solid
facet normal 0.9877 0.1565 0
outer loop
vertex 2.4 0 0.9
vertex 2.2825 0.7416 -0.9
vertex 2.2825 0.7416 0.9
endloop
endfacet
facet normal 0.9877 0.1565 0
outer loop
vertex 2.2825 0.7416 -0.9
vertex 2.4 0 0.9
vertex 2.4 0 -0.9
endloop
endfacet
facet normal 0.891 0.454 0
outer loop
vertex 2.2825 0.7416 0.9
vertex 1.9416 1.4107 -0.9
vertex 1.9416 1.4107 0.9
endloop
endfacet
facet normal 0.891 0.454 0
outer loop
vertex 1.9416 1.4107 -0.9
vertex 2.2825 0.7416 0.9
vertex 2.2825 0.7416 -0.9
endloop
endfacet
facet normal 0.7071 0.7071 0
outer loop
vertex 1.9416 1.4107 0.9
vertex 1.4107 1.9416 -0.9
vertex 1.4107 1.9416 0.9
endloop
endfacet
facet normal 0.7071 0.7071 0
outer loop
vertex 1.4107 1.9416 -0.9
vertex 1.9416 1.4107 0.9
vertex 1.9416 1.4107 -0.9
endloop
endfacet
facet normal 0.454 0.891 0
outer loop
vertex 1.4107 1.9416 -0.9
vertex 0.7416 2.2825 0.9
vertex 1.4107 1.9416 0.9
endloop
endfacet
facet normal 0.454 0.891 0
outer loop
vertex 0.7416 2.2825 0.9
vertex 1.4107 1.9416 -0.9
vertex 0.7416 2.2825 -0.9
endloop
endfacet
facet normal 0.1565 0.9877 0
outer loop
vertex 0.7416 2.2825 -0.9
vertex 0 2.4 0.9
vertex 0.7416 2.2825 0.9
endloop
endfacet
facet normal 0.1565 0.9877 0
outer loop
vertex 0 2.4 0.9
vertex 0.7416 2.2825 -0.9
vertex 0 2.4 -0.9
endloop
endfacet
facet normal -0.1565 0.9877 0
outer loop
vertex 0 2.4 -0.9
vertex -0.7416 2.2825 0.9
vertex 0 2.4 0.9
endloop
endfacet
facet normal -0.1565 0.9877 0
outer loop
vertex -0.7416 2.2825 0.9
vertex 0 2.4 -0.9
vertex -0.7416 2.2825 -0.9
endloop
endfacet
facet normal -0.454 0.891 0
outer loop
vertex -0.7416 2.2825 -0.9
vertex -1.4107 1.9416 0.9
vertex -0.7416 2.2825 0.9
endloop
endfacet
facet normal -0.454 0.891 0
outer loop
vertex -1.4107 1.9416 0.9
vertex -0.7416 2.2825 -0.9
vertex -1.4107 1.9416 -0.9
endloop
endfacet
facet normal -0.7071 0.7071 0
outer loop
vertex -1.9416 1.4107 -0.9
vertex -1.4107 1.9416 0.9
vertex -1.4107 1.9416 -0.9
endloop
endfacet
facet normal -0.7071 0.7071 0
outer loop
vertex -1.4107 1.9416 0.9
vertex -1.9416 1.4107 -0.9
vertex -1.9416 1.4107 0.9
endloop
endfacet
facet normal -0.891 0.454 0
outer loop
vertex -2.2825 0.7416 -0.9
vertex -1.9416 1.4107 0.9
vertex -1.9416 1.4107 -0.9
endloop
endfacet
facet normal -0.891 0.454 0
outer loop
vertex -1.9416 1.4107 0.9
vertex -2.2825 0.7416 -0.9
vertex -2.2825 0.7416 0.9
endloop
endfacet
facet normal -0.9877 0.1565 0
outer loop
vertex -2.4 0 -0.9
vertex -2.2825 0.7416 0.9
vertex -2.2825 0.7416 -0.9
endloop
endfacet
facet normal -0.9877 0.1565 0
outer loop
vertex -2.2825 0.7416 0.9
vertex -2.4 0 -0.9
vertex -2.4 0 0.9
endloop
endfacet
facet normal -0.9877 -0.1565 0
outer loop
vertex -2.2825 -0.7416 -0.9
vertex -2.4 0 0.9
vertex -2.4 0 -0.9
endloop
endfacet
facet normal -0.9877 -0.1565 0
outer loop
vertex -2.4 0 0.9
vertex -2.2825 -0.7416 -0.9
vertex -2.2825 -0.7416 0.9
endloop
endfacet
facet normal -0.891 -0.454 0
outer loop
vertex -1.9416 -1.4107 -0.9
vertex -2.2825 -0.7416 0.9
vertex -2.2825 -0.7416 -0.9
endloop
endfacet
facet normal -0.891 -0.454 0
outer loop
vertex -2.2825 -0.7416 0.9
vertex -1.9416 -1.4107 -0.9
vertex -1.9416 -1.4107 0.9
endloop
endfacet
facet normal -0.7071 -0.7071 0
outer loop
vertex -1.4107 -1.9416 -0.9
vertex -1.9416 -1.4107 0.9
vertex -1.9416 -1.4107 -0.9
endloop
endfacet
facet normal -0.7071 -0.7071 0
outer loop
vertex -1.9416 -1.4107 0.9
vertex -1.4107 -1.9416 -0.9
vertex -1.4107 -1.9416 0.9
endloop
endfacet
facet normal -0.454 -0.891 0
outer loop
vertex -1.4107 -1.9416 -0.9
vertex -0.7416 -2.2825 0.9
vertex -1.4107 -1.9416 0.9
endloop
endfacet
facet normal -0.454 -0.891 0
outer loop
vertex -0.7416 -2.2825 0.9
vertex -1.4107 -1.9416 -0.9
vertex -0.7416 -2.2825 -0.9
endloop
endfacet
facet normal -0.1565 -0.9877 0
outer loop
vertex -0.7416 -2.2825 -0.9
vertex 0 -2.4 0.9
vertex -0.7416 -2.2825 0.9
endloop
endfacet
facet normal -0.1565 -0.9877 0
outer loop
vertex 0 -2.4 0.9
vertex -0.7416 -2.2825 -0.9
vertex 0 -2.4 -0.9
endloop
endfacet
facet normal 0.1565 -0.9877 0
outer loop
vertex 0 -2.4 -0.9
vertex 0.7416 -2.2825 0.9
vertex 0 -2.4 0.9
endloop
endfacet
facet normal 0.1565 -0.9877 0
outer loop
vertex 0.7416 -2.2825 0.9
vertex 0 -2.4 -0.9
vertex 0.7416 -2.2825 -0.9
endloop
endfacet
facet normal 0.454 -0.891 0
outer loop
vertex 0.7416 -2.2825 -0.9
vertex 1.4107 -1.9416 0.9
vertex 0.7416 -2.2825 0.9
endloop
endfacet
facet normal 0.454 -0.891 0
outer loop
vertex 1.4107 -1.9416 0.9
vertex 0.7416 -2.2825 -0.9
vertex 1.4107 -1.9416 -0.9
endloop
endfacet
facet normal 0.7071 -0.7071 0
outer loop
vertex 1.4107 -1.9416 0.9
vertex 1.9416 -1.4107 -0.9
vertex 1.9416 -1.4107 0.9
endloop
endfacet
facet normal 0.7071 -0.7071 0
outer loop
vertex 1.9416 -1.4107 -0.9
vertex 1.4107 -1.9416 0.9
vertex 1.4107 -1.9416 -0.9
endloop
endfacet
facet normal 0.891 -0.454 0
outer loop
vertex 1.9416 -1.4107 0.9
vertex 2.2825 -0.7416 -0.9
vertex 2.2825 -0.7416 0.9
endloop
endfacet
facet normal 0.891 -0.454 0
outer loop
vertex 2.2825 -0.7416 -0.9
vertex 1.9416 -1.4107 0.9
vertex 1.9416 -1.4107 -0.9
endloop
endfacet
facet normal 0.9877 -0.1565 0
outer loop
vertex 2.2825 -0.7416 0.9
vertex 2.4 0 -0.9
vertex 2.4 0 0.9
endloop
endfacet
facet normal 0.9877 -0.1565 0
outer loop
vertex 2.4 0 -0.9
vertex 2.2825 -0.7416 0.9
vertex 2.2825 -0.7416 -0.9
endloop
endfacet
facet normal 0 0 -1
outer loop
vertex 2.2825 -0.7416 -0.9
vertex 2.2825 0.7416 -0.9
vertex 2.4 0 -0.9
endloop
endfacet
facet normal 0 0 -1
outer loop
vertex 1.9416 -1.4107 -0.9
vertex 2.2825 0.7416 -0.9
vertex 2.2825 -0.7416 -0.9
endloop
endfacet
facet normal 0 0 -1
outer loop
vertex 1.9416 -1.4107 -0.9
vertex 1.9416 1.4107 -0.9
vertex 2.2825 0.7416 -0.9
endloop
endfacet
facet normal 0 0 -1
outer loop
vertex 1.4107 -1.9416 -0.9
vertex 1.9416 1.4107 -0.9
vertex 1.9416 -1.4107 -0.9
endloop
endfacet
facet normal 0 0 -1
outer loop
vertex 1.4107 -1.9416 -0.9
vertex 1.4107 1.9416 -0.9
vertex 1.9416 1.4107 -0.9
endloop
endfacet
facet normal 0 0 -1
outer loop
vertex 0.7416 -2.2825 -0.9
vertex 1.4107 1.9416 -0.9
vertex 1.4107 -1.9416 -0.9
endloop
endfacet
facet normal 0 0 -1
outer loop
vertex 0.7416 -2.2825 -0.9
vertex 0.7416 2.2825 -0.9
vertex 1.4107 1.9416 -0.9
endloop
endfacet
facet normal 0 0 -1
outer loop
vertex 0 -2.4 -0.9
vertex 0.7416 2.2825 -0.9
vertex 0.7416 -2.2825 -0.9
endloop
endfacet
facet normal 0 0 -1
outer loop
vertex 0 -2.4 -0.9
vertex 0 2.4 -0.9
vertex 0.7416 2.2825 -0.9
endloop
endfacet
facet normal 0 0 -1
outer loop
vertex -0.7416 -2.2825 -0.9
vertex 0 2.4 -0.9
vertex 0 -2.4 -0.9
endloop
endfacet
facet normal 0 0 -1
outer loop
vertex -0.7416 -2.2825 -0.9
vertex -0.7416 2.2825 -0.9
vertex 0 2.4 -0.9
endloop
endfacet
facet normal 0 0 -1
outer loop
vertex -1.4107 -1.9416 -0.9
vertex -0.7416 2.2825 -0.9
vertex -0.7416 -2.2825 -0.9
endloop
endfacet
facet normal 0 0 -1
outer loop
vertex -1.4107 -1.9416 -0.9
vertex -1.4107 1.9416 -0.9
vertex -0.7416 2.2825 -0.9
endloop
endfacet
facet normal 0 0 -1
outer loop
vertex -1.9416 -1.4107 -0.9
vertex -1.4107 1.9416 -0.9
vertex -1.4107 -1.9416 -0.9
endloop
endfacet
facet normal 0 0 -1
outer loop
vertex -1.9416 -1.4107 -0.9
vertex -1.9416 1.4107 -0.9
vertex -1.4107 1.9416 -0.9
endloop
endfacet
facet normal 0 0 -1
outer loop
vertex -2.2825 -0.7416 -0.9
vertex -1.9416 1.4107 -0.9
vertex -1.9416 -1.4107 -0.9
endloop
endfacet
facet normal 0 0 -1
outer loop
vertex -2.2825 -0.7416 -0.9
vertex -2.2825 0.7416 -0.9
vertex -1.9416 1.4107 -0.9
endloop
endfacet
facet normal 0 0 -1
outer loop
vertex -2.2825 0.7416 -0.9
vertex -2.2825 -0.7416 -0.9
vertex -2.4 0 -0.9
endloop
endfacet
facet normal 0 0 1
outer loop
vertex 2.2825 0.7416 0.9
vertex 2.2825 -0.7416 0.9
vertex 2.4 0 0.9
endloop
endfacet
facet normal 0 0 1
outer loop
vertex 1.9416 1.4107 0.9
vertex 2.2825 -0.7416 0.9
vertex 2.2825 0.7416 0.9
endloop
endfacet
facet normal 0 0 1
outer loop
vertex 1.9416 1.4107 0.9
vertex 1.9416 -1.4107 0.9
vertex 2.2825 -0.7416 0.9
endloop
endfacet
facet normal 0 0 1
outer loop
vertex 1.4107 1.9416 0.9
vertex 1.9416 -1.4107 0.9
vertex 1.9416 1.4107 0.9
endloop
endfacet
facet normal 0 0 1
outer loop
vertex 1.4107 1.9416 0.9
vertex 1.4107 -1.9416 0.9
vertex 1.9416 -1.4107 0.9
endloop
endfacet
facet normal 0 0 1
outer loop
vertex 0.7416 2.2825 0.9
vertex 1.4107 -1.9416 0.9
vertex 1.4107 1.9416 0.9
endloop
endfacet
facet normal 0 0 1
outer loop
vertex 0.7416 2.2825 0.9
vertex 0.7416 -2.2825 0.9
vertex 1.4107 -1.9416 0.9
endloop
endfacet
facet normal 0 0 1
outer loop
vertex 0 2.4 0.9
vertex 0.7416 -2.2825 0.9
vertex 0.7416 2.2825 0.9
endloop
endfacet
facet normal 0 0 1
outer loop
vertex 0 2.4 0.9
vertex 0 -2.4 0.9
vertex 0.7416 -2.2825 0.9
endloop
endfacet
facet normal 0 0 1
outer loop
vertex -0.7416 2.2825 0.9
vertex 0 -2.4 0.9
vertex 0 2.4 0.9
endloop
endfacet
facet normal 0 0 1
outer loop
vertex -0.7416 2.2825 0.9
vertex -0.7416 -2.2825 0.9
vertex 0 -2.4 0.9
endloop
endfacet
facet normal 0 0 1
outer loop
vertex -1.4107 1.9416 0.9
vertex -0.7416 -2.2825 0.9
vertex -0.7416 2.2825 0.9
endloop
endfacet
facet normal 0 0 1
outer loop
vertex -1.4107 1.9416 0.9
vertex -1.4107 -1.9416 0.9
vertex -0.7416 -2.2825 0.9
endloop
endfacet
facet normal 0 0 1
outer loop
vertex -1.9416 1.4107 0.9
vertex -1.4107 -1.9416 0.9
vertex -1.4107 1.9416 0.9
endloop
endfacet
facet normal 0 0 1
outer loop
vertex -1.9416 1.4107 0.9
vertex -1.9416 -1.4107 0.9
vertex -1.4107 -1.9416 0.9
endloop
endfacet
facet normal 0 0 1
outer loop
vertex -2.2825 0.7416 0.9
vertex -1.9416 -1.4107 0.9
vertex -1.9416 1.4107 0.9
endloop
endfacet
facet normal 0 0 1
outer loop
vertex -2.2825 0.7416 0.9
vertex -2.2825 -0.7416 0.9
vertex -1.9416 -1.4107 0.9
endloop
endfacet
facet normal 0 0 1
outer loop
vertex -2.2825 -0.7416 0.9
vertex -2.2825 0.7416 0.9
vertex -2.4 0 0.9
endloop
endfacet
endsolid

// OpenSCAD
//!OpenSCAD

$fn = 20;
// $fn controls the detail on curves

% cube([8,8,9.6], true);
// what does removing the % do?
// what if `true` were `false`?

cylinder(h=1.8, r=2.4, center=true);
// OpenSCAD supports both named parameters, which can make code more clear.
// You can also use ordered params, this works too:
// cylinder(1.8, 2.4, 2.4, true);
